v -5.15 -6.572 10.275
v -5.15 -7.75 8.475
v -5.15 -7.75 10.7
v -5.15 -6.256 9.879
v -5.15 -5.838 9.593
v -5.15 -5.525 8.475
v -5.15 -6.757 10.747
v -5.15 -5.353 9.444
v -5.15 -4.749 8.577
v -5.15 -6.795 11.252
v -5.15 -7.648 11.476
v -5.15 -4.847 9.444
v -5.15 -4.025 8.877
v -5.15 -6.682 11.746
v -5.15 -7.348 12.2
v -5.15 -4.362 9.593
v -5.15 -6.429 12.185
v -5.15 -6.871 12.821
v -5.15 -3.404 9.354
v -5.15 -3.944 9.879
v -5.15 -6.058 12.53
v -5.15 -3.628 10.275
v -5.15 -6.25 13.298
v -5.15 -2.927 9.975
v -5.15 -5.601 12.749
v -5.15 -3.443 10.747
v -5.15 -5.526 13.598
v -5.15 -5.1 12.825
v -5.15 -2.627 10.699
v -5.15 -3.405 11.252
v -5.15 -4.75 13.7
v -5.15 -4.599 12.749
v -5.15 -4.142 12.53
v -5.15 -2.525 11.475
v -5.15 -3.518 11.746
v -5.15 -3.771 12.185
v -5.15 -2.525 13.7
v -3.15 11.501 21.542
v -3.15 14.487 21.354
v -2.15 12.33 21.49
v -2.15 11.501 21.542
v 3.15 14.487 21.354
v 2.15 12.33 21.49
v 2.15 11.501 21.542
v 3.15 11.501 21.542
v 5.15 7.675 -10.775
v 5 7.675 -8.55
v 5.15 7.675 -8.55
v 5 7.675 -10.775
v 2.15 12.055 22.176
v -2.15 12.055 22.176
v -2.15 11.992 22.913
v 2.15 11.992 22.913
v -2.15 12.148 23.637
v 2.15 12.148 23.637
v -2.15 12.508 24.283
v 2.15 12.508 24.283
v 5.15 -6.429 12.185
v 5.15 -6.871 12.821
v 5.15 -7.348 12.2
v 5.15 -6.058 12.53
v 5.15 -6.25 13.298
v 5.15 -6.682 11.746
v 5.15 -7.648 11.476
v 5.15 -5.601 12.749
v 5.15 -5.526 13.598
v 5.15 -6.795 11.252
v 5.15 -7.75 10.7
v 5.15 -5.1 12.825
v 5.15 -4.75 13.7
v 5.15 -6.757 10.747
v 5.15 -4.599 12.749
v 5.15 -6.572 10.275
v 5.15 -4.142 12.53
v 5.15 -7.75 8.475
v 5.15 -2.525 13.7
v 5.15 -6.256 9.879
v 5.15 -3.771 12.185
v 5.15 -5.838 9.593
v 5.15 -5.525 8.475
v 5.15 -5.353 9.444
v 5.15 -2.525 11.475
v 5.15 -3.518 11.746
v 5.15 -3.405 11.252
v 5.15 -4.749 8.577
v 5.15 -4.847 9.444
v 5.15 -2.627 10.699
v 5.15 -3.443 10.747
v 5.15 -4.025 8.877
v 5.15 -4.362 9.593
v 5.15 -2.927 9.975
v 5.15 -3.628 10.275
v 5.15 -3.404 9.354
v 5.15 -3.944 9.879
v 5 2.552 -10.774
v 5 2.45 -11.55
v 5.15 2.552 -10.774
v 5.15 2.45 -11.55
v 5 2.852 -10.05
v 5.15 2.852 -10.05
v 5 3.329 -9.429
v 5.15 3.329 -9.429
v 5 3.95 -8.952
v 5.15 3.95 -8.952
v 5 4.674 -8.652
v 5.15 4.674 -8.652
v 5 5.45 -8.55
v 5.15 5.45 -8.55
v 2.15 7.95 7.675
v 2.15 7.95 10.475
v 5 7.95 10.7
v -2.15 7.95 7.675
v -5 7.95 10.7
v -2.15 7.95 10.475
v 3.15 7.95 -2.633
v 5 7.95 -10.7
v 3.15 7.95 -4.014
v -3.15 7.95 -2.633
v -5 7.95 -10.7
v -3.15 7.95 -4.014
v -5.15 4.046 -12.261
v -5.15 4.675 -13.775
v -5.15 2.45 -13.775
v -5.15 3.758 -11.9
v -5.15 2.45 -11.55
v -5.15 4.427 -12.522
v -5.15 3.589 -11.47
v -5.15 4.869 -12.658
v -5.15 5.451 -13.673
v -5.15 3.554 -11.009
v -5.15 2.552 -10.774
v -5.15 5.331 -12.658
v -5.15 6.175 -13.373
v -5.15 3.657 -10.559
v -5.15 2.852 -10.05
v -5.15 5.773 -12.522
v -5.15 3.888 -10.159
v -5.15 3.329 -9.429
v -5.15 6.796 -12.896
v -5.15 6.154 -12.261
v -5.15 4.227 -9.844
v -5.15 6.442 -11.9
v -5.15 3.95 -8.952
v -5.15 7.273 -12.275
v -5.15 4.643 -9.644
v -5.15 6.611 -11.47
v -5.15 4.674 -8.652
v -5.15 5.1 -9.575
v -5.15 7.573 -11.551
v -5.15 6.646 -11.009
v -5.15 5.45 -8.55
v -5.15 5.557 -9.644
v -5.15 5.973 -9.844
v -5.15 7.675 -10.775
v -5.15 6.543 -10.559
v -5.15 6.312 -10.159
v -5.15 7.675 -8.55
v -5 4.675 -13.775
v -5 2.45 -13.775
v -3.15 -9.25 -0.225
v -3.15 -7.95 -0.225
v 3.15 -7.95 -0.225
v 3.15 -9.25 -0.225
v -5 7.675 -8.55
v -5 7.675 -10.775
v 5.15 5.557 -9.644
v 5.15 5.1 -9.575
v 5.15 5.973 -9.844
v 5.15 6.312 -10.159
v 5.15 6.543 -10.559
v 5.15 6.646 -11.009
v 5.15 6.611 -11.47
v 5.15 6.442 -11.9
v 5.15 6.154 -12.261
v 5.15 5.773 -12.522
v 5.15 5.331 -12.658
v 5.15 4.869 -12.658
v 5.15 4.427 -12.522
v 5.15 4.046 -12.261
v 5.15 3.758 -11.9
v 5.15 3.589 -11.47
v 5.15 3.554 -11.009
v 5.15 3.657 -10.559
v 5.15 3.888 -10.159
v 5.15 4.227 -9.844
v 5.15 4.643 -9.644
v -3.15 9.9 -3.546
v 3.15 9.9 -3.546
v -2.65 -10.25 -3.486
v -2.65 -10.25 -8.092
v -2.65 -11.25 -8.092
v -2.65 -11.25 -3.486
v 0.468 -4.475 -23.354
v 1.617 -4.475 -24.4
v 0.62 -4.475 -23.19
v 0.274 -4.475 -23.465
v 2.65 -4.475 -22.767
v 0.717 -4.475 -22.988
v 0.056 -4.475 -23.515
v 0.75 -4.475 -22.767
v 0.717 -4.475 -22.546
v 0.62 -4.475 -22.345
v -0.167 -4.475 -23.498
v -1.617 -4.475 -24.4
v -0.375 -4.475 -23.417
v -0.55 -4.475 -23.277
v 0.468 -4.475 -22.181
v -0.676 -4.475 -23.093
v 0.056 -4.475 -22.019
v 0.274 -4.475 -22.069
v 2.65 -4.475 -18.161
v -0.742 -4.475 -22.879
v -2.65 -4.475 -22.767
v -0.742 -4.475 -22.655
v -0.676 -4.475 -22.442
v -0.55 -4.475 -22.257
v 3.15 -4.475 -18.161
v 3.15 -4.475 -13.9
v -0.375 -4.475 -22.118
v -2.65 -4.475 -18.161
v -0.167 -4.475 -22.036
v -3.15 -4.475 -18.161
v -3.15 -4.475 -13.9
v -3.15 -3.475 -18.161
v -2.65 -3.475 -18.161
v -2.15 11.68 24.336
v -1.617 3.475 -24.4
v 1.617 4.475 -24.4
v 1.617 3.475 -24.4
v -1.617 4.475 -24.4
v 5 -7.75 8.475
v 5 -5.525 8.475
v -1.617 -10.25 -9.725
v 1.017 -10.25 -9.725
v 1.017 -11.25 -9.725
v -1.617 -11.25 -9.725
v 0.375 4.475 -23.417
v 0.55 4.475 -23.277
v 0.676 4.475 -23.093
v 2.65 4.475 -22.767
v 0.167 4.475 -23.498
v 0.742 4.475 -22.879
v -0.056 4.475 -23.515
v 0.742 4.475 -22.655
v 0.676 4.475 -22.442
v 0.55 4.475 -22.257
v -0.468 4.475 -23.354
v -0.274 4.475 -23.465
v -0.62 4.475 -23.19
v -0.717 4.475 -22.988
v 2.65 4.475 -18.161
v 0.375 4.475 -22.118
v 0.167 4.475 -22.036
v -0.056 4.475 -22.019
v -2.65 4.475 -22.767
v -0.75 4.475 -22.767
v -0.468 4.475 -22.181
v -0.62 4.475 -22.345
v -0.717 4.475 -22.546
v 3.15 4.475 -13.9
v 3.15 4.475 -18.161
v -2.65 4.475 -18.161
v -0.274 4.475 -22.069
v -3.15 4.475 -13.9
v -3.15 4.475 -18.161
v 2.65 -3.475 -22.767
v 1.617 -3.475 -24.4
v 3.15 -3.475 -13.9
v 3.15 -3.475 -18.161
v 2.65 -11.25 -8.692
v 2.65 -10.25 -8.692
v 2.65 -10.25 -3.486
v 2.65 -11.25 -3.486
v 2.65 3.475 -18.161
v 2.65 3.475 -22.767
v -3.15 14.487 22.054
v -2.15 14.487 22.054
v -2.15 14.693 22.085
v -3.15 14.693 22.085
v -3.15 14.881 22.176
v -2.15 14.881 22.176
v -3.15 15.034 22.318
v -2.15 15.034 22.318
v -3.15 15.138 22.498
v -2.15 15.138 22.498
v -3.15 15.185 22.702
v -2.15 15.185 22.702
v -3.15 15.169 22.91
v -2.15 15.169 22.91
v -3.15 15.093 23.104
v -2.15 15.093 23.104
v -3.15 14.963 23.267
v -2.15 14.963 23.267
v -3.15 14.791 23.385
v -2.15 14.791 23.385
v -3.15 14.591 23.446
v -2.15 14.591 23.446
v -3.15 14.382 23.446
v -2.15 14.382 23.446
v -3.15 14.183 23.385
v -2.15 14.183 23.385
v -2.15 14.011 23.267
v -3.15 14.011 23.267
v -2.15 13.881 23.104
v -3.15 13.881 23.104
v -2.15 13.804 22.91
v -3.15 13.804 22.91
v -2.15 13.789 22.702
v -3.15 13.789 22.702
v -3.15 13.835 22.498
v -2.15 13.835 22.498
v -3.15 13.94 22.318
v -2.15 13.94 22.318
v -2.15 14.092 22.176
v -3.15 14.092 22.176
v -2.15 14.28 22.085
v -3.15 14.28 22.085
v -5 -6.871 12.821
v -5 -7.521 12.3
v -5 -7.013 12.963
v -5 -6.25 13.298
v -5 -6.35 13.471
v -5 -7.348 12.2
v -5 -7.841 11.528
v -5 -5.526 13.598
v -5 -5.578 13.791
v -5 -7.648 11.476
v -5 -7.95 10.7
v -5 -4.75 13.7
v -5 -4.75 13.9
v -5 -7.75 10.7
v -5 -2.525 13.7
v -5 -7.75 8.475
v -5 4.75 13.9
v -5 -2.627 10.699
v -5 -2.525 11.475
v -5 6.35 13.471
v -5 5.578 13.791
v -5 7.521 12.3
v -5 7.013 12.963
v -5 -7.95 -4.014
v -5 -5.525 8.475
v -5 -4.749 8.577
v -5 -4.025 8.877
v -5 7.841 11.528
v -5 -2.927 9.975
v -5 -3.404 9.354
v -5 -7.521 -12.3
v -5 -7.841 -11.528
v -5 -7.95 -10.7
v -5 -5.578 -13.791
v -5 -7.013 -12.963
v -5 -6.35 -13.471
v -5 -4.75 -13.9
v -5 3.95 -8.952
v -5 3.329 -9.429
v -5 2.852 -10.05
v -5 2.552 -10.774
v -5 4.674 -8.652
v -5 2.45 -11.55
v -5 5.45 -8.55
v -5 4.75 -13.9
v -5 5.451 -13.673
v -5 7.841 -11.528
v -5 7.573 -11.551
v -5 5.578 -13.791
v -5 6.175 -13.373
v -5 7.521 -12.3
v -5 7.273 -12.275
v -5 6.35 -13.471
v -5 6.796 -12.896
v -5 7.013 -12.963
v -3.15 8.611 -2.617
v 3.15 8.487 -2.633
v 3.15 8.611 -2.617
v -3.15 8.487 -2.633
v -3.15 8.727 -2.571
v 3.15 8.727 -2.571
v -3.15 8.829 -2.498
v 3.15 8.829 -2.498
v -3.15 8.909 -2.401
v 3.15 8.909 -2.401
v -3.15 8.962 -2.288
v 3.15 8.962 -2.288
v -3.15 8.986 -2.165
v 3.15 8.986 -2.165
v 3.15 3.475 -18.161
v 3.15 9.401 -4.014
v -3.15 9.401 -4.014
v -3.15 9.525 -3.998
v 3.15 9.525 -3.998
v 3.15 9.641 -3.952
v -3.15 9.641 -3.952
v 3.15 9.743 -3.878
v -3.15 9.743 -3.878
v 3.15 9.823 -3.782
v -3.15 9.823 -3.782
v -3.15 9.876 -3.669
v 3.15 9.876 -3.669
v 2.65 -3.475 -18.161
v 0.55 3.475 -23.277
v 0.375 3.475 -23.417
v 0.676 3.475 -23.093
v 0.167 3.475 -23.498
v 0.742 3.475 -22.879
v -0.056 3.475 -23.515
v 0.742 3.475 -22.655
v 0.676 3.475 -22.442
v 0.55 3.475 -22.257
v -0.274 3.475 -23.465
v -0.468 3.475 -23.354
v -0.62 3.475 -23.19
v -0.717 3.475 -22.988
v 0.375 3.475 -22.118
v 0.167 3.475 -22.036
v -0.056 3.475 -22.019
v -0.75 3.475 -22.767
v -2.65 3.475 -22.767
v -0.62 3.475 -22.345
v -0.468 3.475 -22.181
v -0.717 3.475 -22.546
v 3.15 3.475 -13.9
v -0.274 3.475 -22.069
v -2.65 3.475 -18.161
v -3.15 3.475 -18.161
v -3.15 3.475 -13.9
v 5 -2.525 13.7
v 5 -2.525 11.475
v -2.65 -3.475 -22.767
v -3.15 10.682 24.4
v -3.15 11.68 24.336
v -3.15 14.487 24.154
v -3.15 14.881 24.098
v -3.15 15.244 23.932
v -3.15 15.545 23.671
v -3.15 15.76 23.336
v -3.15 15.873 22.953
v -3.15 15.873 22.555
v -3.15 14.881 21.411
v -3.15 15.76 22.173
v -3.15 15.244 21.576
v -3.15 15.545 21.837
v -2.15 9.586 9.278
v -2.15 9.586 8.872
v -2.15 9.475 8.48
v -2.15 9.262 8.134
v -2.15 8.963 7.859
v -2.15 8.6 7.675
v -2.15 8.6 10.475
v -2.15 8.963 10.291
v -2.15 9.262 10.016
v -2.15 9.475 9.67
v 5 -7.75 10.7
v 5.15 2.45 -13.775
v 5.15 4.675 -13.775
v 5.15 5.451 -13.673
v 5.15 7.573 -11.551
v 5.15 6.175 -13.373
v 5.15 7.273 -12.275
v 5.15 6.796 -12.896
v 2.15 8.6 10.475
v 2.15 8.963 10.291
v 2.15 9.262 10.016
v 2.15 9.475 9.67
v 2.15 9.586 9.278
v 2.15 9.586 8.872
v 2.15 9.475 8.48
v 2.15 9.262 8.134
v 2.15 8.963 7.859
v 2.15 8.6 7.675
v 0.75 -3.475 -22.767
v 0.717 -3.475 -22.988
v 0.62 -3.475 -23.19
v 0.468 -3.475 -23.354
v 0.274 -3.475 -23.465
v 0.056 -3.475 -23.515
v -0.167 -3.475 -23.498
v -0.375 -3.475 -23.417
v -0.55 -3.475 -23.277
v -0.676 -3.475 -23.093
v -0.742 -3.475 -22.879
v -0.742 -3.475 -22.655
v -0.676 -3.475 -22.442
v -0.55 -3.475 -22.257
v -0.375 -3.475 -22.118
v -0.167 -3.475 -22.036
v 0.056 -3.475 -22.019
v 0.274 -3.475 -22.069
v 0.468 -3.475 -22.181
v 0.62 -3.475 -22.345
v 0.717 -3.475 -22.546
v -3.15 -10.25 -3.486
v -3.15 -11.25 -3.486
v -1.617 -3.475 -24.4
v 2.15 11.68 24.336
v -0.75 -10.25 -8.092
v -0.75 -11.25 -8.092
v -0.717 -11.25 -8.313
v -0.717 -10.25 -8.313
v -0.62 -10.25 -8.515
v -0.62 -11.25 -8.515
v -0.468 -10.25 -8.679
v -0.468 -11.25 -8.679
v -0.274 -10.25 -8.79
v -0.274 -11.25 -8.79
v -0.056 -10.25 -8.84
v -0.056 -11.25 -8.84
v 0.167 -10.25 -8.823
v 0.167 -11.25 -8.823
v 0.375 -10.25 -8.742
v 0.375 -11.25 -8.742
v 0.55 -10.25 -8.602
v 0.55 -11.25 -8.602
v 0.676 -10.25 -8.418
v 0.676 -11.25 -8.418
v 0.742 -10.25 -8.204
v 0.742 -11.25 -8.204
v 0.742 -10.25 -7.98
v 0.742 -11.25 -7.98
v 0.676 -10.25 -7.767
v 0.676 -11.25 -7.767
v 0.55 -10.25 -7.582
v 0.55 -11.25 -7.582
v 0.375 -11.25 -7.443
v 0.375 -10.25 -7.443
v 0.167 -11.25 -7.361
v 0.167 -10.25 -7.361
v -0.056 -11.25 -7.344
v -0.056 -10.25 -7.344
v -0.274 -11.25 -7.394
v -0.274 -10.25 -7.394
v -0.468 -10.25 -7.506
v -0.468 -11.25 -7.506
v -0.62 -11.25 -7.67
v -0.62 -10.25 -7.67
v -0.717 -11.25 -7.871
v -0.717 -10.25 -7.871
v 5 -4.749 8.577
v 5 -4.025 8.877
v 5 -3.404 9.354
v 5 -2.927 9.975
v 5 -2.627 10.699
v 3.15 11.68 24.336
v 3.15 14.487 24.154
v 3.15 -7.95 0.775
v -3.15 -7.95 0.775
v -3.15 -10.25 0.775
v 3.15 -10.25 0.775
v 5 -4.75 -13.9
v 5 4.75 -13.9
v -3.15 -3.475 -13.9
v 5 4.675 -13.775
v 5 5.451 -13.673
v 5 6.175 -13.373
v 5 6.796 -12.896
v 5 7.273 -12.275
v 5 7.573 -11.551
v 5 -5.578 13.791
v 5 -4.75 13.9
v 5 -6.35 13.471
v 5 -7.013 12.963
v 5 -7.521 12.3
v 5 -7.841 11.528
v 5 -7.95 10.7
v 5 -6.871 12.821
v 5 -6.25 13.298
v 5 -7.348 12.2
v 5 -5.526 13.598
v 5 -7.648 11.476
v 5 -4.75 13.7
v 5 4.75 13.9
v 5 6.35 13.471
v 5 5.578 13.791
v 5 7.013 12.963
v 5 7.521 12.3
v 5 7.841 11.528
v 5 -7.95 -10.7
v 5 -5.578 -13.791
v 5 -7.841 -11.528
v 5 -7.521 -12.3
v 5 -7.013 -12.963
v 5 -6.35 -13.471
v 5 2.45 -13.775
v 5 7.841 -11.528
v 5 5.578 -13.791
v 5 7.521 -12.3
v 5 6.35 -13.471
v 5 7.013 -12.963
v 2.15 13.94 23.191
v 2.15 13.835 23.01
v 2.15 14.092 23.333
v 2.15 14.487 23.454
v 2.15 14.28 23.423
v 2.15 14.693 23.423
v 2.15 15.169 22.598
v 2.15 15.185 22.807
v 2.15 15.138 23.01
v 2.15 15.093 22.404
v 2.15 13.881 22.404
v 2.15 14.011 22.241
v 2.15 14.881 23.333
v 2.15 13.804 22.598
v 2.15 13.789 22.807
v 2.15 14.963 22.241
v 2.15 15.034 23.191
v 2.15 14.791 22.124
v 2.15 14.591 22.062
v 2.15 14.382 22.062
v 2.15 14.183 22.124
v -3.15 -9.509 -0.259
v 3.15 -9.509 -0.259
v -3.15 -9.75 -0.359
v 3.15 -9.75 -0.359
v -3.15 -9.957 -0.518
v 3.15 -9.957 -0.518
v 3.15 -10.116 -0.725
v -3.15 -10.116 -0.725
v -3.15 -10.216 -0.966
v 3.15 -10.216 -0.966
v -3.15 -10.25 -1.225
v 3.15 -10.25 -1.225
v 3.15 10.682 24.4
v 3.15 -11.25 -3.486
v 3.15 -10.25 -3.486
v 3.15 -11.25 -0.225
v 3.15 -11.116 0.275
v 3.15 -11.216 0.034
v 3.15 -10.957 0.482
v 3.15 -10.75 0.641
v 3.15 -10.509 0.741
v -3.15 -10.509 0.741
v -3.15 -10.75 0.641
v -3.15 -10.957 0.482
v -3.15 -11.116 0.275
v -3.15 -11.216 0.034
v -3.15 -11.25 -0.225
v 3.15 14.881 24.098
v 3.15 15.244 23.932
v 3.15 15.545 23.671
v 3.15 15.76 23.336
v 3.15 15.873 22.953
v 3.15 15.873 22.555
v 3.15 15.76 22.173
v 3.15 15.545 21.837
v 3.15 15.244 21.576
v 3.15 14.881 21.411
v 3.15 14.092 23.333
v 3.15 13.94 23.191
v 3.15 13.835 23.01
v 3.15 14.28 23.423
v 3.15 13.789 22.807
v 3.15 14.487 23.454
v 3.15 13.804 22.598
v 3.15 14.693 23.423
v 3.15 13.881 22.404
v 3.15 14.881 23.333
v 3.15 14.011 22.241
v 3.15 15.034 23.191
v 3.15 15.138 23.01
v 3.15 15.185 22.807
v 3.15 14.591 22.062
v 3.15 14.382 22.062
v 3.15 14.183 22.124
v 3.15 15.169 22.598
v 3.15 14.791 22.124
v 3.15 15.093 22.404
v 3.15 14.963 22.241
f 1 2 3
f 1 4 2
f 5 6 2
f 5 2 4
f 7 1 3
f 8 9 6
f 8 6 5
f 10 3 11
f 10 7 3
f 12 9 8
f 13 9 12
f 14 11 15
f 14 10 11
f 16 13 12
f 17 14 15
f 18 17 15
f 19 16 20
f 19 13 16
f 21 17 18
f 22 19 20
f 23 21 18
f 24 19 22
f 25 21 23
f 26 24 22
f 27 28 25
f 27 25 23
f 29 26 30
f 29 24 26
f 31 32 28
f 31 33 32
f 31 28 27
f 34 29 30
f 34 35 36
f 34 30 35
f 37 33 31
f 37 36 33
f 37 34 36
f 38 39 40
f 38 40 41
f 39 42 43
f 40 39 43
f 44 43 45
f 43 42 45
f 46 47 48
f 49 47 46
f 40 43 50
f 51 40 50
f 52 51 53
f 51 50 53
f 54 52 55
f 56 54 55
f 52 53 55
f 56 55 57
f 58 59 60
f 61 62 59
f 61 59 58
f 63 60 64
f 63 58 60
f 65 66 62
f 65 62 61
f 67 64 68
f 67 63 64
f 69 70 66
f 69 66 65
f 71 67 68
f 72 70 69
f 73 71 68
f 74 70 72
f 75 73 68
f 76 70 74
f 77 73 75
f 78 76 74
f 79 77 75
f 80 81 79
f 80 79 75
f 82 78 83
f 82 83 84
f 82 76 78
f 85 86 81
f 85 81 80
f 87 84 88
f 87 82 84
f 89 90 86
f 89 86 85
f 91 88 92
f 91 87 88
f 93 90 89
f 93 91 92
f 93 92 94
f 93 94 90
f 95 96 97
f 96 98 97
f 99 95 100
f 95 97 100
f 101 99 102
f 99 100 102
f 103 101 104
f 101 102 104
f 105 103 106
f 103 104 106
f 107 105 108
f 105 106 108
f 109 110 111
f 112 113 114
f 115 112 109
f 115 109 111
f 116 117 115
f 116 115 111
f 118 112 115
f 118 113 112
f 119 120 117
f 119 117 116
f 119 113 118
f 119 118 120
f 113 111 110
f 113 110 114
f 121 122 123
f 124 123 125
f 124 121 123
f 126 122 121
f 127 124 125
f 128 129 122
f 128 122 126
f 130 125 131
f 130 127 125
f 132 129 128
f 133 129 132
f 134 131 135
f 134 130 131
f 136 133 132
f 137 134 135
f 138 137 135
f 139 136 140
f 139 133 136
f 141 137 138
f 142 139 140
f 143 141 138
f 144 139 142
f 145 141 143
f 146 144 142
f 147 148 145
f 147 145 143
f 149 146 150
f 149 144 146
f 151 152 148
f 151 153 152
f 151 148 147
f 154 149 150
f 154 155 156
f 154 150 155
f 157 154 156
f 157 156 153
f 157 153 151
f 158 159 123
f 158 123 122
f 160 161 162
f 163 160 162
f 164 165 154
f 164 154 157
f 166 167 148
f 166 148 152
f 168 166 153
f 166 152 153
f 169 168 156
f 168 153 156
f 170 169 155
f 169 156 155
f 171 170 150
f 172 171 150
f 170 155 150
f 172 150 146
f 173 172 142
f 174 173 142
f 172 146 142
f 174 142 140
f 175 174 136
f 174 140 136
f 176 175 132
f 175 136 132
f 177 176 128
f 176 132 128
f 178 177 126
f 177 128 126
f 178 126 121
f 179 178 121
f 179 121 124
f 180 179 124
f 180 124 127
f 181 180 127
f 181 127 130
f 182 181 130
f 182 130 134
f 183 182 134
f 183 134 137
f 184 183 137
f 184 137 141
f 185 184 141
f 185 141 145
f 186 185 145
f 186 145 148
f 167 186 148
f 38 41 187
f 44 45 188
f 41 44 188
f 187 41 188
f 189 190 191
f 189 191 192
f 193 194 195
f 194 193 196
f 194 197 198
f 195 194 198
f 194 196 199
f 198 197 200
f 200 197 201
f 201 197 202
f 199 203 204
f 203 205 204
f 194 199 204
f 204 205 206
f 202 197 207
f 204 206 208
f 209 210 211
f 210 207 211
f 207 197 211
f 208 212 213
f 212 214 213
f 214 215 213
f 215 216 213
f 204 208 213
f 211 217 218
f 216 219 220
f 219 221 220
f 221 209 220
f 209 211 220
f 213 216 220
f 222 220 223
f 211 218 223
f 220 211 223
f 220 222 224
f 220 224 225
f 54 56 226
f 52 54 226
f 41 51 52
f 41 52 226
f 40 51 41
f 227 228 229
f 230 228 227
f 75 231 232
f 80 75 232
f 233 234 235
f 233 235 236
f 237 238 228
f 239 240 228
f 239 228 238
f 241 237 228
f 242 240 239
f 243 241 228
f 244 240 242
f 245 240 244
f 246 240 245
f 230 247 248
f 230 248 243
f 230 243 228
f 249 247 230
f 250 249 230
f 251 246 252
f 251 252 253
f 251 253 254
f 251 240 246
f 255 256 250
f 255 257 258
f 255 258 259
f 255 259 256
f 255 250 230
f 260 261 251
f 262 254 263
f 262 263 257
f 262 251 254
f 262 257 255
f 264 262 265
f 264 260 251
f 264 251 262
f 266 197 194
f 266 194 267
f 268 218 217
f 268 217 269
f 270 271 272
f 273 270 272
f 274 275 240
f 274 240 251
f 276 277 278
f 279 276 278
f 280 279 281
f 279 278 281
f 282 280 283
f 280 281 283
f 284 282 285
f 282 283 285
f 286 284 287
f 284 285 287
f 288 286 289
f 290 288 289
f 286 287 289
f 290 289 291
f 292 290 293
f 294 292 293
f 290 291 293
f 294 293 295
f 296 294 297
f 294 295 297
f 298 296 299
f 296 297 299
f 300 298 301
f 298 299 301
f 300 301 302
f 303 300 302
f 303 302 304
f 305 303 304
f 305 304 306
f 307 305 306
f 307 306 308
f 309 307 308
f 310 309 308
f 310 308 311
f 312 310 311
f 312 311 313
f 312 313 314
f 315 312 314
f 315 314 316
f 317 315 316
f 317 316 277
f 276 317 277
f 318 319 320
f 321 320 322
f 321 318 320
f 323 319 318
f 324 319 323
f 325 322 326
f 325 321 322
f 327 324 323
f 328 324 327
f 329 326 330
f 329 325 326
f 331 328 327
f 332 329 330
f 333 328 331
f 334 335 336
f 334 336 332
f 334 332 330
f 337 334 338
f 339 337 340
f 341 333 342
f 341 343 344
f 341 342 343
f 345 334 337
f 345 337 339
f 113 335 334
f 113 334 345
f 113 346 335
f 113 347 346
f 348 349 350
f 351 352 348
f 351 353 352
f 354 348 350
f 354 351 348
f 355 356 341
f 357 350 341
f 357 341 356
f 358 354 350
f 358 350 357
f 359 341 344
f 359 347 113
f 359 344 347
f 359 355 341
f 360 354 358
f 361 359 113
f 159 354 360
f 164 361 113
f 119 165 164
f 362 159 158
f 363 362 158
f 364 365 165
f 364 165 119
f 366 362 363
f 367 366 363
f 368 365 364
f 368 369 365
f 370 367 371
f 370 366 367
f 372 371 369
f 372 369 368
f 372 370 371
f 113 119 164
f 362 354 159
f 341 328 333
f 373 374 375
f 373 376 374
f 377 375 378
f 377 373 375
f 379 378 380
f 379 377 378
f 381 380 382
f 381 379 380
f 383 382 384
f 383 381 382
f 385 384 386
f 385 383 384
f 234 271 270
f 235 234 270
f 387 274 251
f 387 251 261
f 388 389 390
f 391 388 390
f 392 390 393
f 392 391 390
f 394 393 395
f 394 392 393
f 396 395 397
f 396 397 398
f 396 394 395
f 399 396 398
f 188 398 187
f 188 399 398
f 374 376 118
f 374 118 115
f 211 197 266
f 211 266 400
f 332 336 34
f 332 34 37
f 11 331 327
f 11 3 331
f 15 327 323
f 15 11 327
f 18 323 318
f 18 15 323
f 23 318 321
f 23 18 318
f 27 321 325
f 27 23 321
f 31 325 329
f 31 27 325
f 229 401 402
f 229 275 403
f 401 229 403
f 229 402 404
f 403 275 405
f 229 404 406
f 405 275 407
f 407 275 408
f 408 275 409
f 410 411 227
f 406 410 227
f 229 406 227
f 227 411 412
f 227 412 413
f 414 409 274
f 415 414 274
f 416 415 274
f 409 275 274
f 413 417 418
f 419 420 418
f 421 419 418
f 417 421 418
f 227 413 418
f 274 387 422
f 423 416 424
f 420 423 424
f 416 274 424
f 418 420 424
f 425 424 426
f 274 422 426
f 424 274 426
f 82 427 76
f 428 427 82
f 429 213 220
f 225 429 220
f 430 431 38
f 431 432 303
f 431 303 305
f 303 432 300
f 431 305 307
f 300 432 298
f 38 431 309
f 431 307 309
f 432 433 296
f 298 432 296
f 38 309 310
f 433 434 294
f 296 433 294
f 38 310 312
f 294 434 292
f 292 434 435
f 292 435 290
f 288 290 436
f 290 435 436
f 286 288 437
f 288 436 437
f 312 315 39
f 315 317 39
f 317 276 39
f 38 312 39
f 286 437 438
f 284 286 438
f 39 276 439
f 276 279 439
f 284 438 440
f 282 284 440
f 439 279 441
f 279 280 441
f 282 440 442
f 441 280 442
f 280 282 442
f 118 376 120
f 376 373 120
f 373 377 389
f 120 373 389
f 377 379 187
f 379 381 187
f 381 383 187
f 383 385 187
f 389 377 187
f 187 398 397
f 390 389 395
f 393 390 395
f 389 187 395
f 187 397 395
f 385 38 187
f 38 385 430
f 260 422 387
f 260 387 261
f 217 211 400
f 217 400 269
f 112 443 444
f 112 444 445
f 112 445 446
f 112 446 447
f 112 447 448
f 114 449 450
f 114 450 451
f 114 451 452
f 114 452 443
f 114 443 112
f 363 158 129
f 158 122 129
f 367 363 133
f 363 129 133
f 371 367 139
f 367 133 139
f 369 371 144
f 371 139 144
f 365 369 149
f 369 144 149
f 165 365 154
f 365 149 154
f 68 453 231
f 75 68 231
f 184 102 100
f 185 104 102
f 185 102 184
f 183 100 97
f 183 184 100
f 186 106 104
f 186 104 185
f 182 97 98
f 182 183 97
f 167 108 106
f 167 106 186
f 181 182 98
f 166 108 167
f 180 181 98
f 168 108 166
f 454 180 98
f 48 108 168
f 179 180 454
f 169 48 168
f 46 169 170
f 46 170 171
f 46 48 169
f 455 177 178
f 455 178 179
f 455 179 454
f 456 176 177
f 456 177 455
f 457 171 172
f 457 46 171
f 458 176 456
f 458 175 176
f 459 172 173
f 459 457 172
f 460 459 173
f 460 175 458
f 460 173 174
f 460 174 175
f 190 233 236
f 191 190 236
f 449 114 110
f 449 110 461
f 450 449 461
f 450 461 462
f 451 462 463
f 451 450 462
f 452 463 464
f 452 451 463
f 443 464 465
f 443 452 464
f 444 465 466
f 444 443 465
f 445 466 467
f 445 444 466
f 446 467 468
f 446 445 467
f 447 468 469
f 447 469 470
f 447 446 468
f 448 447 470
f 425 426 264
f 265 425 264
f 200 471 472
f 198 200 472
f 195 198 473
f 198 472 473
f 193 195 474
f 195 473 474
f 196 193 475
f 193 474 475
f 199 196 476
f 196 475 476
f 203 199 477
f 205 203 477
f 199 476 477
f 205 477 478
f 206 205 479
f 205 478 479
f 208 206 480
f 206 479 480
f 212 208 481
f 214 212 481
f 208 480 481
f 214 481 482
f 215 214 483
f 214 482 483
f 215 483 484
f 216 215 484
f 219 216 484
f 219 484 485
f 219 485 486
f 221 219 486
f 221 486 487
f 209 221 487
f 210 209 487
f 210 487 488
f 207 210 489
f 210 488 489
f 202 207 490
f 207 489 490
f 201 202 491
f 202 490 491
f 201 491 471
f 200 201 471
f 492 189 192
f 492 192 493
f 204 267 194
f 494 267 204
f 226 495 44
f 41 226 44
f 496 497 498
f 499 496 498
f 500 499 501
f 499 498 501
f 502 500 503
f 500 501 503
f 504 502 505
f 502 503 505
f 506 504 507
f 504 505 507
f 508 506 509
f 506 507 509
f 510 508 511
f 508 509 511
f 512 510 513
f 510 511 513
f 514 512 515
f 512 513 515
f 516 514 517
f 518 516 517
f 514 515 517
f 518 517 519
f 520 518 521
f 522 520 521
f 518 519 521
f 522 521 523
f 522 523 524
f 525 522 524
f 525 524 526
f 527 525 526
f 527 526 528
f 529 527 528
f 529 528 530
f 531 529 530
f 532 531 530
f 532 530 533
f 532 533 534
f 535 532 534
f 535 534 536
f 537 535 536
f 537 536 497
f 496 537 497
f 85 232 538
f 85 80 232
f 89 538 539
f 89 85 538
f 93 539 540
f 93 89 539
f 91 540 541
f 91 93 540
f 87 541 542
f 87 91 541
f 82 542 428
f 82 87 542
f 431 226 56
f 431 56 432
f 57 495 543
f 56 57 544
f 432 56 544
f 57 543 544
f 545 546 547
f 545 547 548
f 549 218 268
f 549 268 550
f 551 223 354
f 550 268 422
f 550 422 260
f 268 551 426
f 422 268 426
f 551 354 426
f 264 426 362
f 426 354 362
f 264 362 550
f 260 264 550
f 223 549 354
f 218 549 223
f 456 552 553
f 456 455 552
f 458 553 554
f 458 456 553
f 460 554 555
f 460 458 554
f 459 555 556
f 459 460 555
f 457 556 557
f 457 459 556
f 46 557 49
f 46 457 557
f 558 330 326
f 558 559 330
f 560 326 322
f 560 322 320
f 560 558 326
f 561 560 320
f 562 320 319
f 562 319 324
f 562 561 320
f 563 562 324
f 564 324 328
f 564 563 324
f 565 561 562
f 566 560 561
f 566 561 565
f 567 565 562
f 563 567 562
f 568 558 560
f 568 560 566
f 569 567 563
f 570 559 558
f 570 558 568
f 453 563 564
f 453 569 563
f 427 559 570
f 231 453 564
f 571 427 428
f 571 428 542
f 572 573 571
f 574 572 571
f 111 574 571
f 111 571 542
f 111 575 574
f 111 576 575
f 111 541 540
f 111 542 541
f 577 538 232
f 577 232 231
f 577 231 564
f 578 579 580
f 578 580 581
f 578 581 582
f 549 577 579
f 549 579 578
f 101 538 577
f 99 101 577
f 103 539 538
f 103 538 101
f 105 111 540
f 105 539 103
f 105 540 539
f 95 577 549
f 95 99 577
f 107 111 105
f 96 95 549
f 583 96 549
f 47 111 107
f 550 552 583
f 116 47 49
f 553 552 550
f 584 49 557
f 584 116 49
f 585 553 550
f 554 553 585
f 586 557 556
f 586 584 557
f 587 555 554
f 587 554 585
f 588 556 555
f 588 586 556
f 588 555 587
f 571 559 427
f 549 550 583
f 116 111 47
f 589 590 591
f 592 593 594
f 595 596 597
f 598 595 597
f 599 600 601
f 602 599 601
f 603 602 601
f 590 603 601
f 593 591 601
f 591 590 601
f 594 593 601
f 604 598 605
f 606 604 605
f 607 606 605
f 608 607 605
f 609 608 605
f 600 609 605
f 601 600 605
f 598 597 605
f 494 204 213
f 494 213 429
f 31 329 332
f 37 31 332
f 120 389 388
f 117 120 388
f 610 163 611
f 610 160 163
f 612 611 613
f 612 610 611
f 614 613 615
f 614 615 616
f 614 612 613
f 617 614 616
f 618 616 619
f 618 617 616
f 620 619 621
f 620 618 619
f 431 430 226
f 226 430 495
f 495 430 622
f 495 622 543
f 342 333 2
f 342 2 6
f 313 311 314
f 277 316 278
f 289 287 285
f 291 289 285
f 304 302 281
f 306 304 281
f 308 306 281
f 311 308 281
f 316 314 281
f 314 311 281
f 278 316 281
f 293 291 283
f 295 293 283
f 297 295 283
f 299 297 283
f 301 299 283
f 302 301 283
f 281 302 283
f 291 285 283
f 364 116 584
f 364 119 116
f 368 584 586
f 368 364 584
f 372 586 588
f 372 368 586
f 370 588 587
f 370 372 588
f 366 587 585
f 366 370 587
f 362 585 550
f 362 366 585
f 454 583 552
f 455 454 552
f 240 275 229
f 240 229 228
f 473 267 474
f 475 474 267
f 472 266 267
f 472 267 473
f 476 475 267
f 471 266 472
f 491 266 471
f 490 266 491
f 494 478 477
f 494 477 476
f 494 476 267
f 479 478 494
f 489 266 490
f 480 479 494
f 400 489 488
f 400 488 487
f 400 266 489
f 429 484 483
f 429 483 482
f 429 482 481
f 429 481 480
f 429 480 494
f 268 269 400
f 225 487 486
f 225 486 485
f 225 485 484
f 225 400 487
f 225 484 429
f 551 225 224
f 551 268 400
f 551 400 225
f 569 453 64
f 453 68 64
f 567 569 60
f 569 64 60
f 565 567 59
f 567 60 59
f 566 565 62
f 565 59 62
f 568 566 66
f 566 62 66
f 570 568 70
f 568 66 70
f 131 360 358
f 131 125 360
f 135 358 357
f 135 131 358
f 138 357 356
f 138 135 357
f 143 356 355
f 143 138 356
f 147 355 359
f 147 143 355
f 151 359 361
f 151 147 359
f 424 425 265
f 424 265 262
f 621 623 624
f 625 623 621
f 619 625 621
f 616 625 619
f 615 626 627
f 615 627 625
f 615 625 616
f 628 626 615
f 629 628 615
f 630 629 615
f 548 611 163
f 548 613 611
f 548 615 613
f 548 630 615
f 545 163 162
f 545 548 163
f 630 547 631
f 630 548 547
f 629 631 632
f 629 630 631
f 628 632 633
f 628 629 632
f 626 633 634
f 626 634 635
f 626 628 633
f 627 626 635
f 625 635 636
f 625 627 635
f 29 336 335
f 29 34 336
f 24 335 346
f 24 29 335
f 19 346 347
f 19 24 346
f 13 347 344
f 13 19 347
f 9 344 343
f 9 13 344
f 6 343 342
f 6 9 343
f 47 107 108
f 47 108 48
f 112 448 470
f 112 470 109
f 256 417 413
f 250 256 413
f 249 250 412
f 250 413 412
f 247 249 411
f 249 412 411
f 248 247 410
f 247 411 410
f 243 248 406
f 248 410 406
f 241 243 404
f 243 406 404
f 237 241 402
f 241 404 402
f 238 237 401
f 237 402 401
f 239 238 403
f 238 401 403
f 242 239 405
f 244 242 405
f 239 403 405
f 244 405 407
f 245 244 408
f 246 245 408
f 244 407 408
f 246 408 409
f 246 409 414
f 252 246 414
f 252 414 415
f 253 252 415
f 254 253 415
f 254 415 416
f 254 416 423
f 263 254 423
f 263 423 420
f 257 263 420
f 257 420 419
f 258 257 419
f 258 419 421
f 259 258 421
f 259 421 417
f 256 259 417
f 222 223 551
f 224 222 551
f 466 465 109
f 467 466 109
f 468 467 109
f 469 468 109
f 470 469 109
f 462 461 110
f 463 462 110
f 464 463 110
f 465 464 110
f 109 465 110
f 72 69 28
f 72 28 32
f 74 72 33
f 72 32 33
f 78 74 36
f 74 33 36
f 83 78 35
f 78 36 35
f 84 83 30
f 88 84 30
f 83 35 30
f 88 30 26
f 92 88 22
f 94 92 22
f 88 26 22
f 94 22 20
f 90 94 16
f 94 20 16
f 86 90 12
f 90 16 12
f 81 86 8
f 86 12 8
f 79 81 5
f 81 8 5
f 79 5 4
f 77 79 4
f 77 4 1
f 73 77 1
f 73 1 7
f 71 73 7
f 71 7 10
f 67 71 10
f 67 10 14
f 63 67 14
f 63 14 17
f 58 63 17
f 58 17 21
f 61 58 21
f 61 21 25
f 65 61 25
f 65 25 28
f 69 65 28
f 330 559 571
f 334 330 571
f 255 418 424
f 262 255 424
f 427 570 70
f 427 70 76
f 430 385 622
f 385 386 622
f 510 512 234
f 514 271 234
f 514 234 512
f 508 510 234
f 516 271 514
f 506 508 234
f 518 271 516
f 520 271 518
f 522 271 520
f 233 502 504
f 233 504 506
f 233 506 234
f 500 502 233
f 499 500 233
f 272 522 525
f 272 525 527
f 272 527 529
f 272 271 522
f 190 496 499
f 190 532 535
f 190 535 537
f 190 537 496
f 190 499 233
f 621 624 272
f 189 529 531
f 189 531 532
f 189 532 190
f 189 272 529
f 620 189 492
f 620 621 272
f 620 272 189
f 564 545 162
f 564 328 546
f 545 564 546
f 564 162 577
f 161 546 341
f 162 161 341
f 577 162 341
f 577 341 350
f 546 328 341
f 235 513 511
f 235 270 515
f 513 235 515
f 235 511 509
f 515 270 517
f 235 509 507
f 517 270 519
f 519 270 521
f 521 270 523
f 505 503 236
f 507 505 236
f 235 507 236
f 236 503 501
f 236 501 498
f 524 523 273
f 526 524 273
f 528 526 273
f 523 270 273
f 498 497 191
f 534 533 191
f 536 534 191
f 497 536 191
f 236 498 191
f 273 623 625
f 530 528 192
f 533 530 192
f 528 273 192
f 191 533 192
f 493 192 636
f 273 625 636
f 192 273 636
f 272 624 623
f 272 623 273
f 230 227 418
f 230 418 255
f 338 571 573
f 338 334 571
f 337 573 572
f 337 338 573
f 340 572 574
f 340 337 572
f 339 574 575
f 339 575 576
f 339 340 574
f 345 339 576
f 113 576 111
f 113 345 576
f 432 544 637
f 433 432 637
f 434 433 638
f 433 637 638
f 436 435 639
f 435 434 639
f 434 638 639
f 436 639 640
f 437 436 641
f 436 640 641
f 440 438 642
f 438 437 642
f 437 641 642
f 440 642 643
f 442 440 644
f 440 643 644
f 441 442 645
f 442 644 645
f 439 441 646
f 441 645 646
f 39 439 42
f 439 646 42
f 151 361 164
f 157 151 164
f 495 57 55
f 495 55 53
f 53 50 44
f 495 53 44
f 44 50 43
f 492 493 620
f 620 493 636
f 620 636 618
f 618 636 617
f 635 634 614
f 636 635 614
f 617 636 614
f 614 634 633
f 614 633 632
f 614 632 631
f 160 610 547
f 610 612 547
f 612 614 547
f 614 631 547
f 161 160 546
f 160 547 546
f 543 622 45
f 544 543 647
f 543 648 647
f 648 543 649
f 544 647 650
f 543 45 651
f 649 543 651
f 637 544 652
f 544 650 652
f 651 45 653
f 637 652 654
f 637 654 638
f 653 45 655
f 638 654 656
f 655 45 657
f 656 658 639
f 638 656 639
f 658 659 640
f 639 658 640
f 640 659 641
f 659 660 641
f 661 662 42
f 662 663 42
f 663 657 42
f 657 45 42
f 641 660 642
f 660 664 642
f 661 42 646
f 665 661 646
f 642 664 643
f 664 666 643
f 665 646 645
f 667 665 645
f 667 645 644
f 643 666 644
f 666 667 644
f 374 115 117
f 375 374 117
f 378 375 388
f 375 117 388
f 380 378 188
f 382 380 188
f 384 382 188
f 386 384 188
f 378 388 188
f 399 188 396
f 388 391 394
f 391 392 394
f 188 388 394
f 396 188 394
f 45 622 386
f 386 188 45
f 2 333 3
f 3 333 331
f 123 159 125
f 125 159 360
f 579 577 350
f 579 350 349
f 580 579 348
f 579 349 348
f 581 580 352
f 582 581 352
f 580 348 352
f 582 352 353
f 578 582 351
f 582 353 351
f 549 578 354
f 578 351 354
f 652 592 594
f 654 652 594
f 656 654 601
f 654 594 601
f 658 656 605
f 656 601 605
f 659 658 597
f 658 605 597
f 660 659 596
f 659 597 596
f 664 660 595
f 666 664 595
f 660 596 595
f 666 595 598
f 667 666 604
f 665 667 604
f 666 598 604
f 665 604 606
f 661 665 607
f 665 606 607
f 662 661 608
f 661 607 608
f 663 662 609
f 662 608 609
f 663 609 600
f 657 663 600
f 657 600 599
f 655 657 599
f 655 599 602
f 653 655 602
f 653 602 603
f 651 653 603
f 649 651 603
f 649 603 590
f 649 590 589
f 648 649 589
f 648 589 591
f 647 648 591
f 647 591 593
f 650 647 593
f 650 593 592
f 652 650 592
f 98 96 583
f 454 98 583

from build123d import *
from OCP.BRepFilletAPI import BRepFilletAPI_MakeChamfer

# Parameters (mm, degrees)
BOSS_EXTRUDE1_DEPTH        = 4.3
BOSS_EXTRUDE2_DEPTH        = 1
BOSS_EXTRUDE3_START        = 1
BOSS_EXTRUDE3_DEPTH        = 1
CUT_EXTRUDE1_DEPTH         = 4.3
SKETCH5_W                  = 1.380694599
SKETCH5_H                  = 0.913887033
BOSS_EXTRUDE4_DEPTH        = 1.85
SKETCH6_W                  = 8.15
SKETCH6_H                  = 1.380694599
BOSS_EXTRUDE5_DEPTH        = 16.905731032
SKETCH7_W                  = 8.15
SKETCH7_H                  = 17.819618065
BOSS_EXTRUDE6_DEPTH        = 9.886282081
CUT_EXTRUDE2_DEPTH         = 0.913887033
CUT_EXTRUDE3_DEPTH         = 1.005731032
SKETCH10_W                 = 8.15
SKETCH10_H                 = 15.9
BOSS_EXTRUDE7_DEPTH        = 16.53302332
SKETCH11_W                 = 27.8
SKETCH11_H                 = 15.9
BOSS_EXTRUDE8_DEPTH        = 1.85
SKETCH12_W                 = 6.3
SKETCH12_H                 = 1
BOSS_EXTRUDE9_DEPTH        = 3.3
SKETCH13_W                 = 6.3
SKETCH13_H                 = 1
BOSS_EXTRUDE10_DEPTH       = 9.5
SKETCH14_W                 = 0.5
SKETCH14_H                 = 6.238763167
CUT_EXTRUDE4_DEPTH         = 37.103920655
SKETCH15_W                 = 0.5
SKETCH15_H                 = 6.238763167
CUT_EXTRUDE5_DEPTH         = 37.103920655
SKETCH16_W                 = 6.3
SKETCH16_H                 = 1
BOSS_EXTRUDE11_DEPTH       = 10.5
SKETCH17_W                 = 0.5
SKETCH17_H                 = 6.238763167
CUT_EXTRUDE6_DEPTH         = 29.934160174
SKETCH18_W                 = 0.5
SKETCH18_H                 = 6.238763167
CUT_EXTRUDE7_DEPTH         = 29.934160174
SKETCH19_W                 = 6.3
SKETCH19_H                 = 1
BOSS_EXTRUDE12_DEPTH       = 10.5
SKETCH20_W                 = 0.5
SKETCH20_H                 = 6.238763167
CUT_EXTRUDE8_DEPTH         = 33.170848621
SKETCH21_W                 = 0.5
SKETCH21_H                 = 6.238763167
CUT_EXTRUDE9_DEPTH         = 33.170848621
SKETCH22_W                 = 5.225
SKETCH22_H                 = 5.225
BOSS_EXTRUDE13_DEPTH       = 0.15
SKETCH23_W                 = 5.225
SKETCH23_H                 = 5.225
BOSS_EXTRUDE14_DEPTH       = 0.15
BOSS_EXTRUDE15_DEPTH       = 4.3
SKETCH25_W                 = 5.225
SKETCH25_H                 = 5.225
BOSS_EXTRUDE16_DEPTH       = 0.15
SKETCH26_W                 = 5.225
SKETCH26_H                 = 5.225
BOSS_EXTRUDE17_DEPTH       = 0.15
F_00_CLEARANCE_HOLE1_D     = 1.5
F_00_CLEARANCE_HOLE1_DEPTH = 1
F_00_CLEARANCE_HOLE2_D     = 1.5
F_00_CLEARANCE_HOLE2_DEPTH = 15.725
F_4_CLEARANCE_HOLE1_D      = 3.1
F_4_CLEARANCE_HOLE2_D      = 3.4
F_00_CLEARANCE_HOLE3_D     = 1.5
F_00_CLEARANCE_HOLE3_DEPTH = 1
F_00_CLEARANCE_HOLE4_D     = 1.4
F_00_CLEARANCE_HOLE4_DEPTH = 1
F_00_CLEARANCE_HOLE5_D     = 1.4
F_00_CLEARANCE_HOLE5_DEPTH = 1
CHAMFER1_SIZE              = 1.632857048
CHAMFER1_SIZE2             = 1.033032958
CHAMFER2_SIZE              = 1.033032958
CHAMFER2_SIZE2             = 1.632857048
CHAMFER3_SIZE              = 1.632857048
CHAMFER3_SIZE2             = 1.033032958
FILLET1_R                  = 0.5
FILLET2_R                  = 1
FILLET3_R                  = 3
FILLET4_R                  = 3.2


with BuildPart() as part:
    # Sketch1 → Boss-Extrude1 (new body)
    with BuildSketch(Plane(origin=(2.15, 0, 0), x_dir=(0, 0, -1), z_dir=(1, 0, 0))):
        with BuildLine():
            Line((2.63302332, 8.955731032), (4.013717919, 8.955731032))
            Line((4.013717919, 8.955731032), (4.013717919, 9.869618065))
            Line((4.013717919, 9.869618065), (-21.541974901, 11.501192936))
            Line((-21.541974901, 11.501192936), (-21.354211514, 14.486814776))
            ThreePointArc((-21.354211514, 14.486814776), (-22.754211514, 15.886814776), (-24.154211514, 14.486814776))
            Line((-24.154211514, 14.486814776), (-24.336285828, 11.679592619))
            Line((-24.336285828, 11.679592619), (-24.4, 10.681624431))
            Line((-24.4, 10.681624431), (2.63302332, 8.955731032))
        make_face()
    extrude(amount=-BOSS_EXTRUDE1_DEPTH)

    # Sketch2 → Boss-Extrude2 (add)
    with BuildSketch(Plane.ZY.offset(2.15)):
        with BuildLine():
            Line((-2.63302332, 8.955731032), (-4.013717919, 8.955731032))
            Line((-4.013717919, 8.955731032), (-4.013717919, 9.869618065))
            Line((-4.013717919, 9.869618065), (21.541974901, 11.501192936))
            Line((21.541974901, 11.501192936), (21.354211514, 14.486814776))
            ThreePointArc((21.354211514, 14.486814776), (22.754211514, 15.886814776), (24.154211514, 14.486814776))
            Line((24.154211514, 14.486814776), (24.336285828, 11.679592619))
            Line((24.336285828, 11.679592619), (24.4, 10.681624431))
            Line((24.4, 10.681624431), (-2.63302332, 8.955731032))
        make_face()
    extrude(amount=BOSS_EXTRUDE2_DEPTH)

    # Sketch3 → Boss-Extrude3 (add)
    with BuildSketch(Plane(origin=(2.15, 0, 0), x_dir=(0, 0, -1), z_dir=(1, 0, 0)).offset(BOSS_EXTRUDE3_START)):
        with BuildLine():
            Line((4.013717919, 8.955731032), (2.63302332, 8.955731032))
            Line((2.63302332, 8.955731032), (-24.4, 10.681624431))
            Line((-24.4, 10.681624431), (-24.336285828, 11.679592619))
            Line((-24.336285828, 11.679592619), (-24.154211514, 14.486814776))
            ThreePointArc((-24.154211514, 14.486814776), (-22.754211514, 15.886814776), (-21.354211514, 14.486814776))
            Line((-21.354211514, 14.486814776), (-21.541974901, 11.501192936))
            Line((-21.541974901, 11.501192936), (4.013717919, 9.869618065))
            Line((4.013717919, 9.869618065), (4.013717919, 8.955731032))
        make_face()
    extrude(amount=-BOSS_EXTRUDE3_DEPTH)

    # Sketch4 → Cut-Extrude1 (cut)
    with BuildSketch(Plane(origin=(2.15, 0, 0), x_dir=(0, 0, -1), z_dir=(1, 0, 0))):
        with BuildLine():
            Line((-24.28253184, 12.508371707), (-24.336285828, 11.679592619))
            Line((-24.336285828, 11.679592619), (-21.541974901, 11.501192936))
            Line((-21.541974901, 11.501192936), (-21.489844991, 12.330109582))
            ThreePointArc((-21.489844991, 12.330109582), (-22.913466809, 11.991892383), (-24.28253184, 12.508371707))
        make_face()
    extrude(amount=-CUT_EXTRUDE1_DEPTH, mode=Mode.SUBTRACT)

    # Sketch5 → Boss-Extrude4 (add)
    with BuildSketch(Plane.ZY.offset(3.15)):
        with Locations((-3.32337062, 9.412674549)):
            Rectangle(SKETCH5_W, SKETCH5_H)
    extrude(amount=BOSS_EXTRUDE4_DEPTH)

    # Sketch6 → Boss-Extrude5 (add)
    with BuildSketch(Plane.XZ.offset(-8.955731032)):
        with Locations((-0.925, -3.32337062)):
            Rectangle(SKETCH6_W, SKETCH6_H)
    extrude(amount=BOSS_EXTRUDE5_DEPTH)

    # Sketch7 → Boss-Extrude6 (add)
    with BuildSketch(Plane(origin=(0, 0, -4.013717919), x_dir=(-1, 0, 0), z_dir=(0, 0, -1))):
        with Locations((0.925, 0.959809033)):
            Rectangle(SKETCH7_W, SKETCH7_H)
    extrude(amount=BOSS_EXTRUDE6_DEPTH)

    # Sketch8 → Cut-Extrude2 (cut)
    with BuildSketch(Plane(origin=(0, 9.869618065, 0), x_dir=(-1, 0, 0), z_dir=(0, 1, 0))):
        Polygon((5, -13.9), (5, -2.63302332), (3.15, -2.63302332), (3.15, -4.013717919), (-3.15, -4.013717919), (-3.15, -13.9), align=None)
    extrude(amount=-CUT_EXTRUDE2_DEPTH, mode=Mode.SUBTRACT)

    # Sketch9 → Cut-Extrude3 (cut)
    with BuildSketch(Plane(origin=(0, 8.955731032, 0), x_dir=(-1, 0, 0), z_dir=(0, 1, 0))):
        Polygon((5, -13.9), (5, -2.63302332), (3.15, -2.63302332), (3.15, -4.013717919), (-3.15, -4.013717919), (-3.15, -13.9), align=None)
    extrude(amount=-CUT_EXTRUDE3_DEPTH, mode=Mode.SUBTRACT)

    # Sketch10 → Boss-Extrude7 (add)
    with BuildSketch(Plane.XY.offset(-2.63302332)):
        with Locations((-0.925, 0)):
            Rectangle(SKETCH10_W, SKETCH10_H)
    extrude(amount=BOSS_EXTRUDE7_DEPTH)

    # Sketch11 → Boss-Extrude8 (add)
    with BuildSketch(Plane(origin=(3.15, 0, 0), x_dir=(0, 0, -1), z_dir=(1, 0, 0))):
        Rectangle(SKETCH11_W, SKETCH11_H)
    extrude(amount=BOSS_EXTRUDE8_DEPTH)

    # Sketch12 → Boss-Extrude9 (add)
    with BuildSketch(Plane.XZ.offset(7.95)):
        with Locations((0, 0.275)):
            Rectangle(SKETCH12_W, SKETCH12_H)
    extrude(amount=BOSS_EXTRUDE9_DEPTH)

    # Sketch13 → Boss-Extrude10 (add)
    with BuildSketch(Plane(origin=(0, 0, -0.225), x_dir=(-1, 0, 0), z_dir=(0, 0, -1))):
        with Locations((0, -10.75)):
            Rectangle(SKETCH13_W, SKETCH13_H)
    extrude(amount=BOSS_EXTRUDE10_DEPTH)

    # Sketch14 → Cut-Extrude4 (cut, through all)
    with BuildSketch(Plane(origin=(0, -10.25, 0), x_dir=(-1, 0, 0), z_dir=(0, 1, 0))):
        with Locations((2.9, -6.605618417)):
            Rectangle(SKETCH14_W, SKETCH14_H)
    extrude(amount=-CUT_EXTRUDE4_DEPTH, mode=Mode.SUBTRACT)

    # Sketch15 → Cut-Extrude5 (cut, through all)
    with BuildSketch(Plane(origin=(0, -10.25, 0), x_dir=(-1, 0, 0), z_dir=(0, 1, 0))):
        with Locations((-2.9, -6.605618417)):
            Rectangle(SKETCH15_W, SKETCH15_H)
    extrude(amount=-CUT_EXTRUDE5_DEPTH, mode=Mode.SUBTRACT)

    # Sketch16 → Boss-Extrude11 (add)
    with BuildSketch(Plane(origin=(0, 0, -13.9), x_dir=(-1, 0, 0), z_dir=(0, 0, -1))):
        with Locations((0, 3.975)):
            Rectangle(SKETCH16_W, SKETCH16_H)
    extrude(amount=BOSS_EXTRUDE11_DEPTH)

    # Sketch17 → Cut-Extrude6 (cut, through all)
    with BuildSketch(Plane.XZ.offset(-3.475)):
        with Locations((2.9, -21.280618417)):
            Rectangle(SKETCH17_W, SKETCH17_H)
    extrude(amount=-CUT_EXTRUDE6_DEPTH, mode=Mode.SUBTRACT)

    # Sketch18 → Cut-Extrude7 (cut, through all)
    with BuildSketch(Plane.XZ.offset(-3.475)):
        with Locations((-2.9, -21.280618417)):
            Rectangle(SKETCH18_W, SKETCH18_H)
    extrude(amount=-CUT_EXTRUDE7_DEPTH, mode=Mode.SUBTRACT)

    # Sketch19 → Boss-Extrude12 (add)
    with BuildSketch(Plane(origin=(0, 0, -13.9), x_dir=(-1, 0, 0), z_dir=(0, 0, -1))):
        with Locations((0, -3.975)):
            Rectangle(SKETCH19_W, SKETCH19_H)
    extrude(amount=BOSS_EXTRUDE12_DEPTH)

    # Sketch20 → Cut-Extrude8 (cut, through all)
    with BuildSketch(Plane.XZ.offset(4.475)):
        with Locations((2.9, -21.280618417)):
            Rectangle(SKETCH20_W, SKETCH20_H)
    extrude(amount=-CUT_EXTRUDE8_DEPTH, mode=Mode.SUBTRACT)

    # Sketch21 → Cut-Extrude9 (cut, through all)
    with BuildSketch(Plane.XZ.offset(4.475)):
        with Locations((-2.9, -21.280618417)):
            Rectangle(SKETCH21_W, SKETCH21_H)
    extrude(amount=-CUT_EXTRUDE9_DEPTH, mode=Mode.SUBTRACT)

    # Sketch22 → Boss-Extrude13 (add)
    with BuildSketch(Plane.ZY.offset(5)):
        with Locations((-11.1625, 5.0625)):
            Rectangle(SKETCH22_W, SKETCH22_H)
    extrude(amount=BOSS_EXTRUDE13_DEPTH)

    # Sketch23 → Boss-Extrude14 (add)
    with BuildSketch(Plane.ZY.offset(5)):
        with Locations((11.0875, -5.1375)):
            Rectangle(SKETCH23_W, SKETCH23_H)
    extrude(amount=BOSS_EXTRUDE14_DEPTH)

    # Sketch24 → Boss-Extrude15 (add)
    with BuildSketch(Plane(origin=(-2.15, 0, 0), x_dir=(0, -1, 0), z_dir=(-1, 0, 0))):
        with BuildLine():
            Line((-8.6, 7.675), (-7.95, 7.675))
            Line((-7.95, 7.675), (-7.95, 10.475))
            Line((-7.95, 10.475), (-8.6, 10.475))
            ThreePointArc((-8.6, 10.475), (-9.6, 9.075), (-8.6, 7.675))
        make_face()
    extrude(amount=-BOSS_EXTRUDE15_DEPTH)

    # Sketch25 → Boss-Extrude16 (add)
    with BuildSketch(Plane(origin=(5, 0, 0), x_dir=(0, 0, -1), z_dir=(1, 0, 0))):
        with Locations((-11.0875, -5.1375)):
            Rectangle(SKETCH25_W, SKETCH25_H)
    extrude(amount=BOSS_EXTRUDE16_DEPTH)

    # Sketch26 → Boss-Extrude17 (add)
    with BuildSketch(Plane(origin=(5, 0, 0), x_dir=(0, 0, -1), z_dir=(1, 0, 0))):
        with Locations((11.1625, 5.0625)):
            Rectangle(SKETCH26_W, SKETCH26_H)
    extrude(amount=BOSS_EXTRUDE17_DEPTH)

    # #00 Clearance Hole1
    with Locations(Plane(origin=(0, -4.475, 0), x_dir=(-1, 0, 0), z_dir=(0, -1, 0))):
        with Locations((0, 22.767142952)):
            Hole(F_00_CLEARANCE_HOLE1_D / 2, depth=F_00_CLEARANCE_HOLE1_DEPTH)

    # #00 Clearance Hole2
    with Locations(Plane(origin=(0, 4.475, 0), x_dir=(1, 0, 0), z_dir=(0, 1, 0))):
        with Locations((0, 22.767142952)):
            Hole(F_00_CLEARANCE_HOLE2_D / 2, depth=F_00_CLEARANCE_HOLE2_DEPTH)

    # #4 Clearance Hole1 (through all)
    with Locations(Plane(origin=(5.15, 0, 0), x_dir=(0, 0, -1), z_dir=(1, 0, 0))):
        with Locations((11.125, 5.1)):
            Hole(F_4_CLEARANCE_HOLE1_D / 2)

    # #4 Clearance Hole2 (through all)
    with Locations(Plane(origin=(5.15, 0, 0), x_dir=(0, 0, -1), z_dir=(1, 0, 0))):
        with Locations((-11.125, -5.1)):
            Hole(F_4_CLEARANCE_HOLE2_D / 2)

    # #00 Clearance Hole3
    with Locations(Plane(origin=(0, -10.25, 0), x_dir=(1, 0, 0), z_dir=(0, 1, 0))):
        with Locations((0, 8.092142952)):
            Hole(F_00_CLEARANCE_HOLE3_D / 2, depth=F_00_CLEARANCE_HOLE3_DEPTH)

    # #00 Clearance Hole4
    with Locations(Plane(origin=(3.15, 0, 0), x_dir=(0, 0, -1), z_dir=(1, 0, 0))):
        with Locations((-22.754211514, 14.486814776)):
            Hole(F_00_CLEARANCE_HOLE4_D / 2, depth=F_00_CLEARANCE_HOLE4_DEPTH)

    # #00 Clearance Hole5
    with Locations(Plane.ZY.offset(3.15)):
        with Locations((22.754211514, 14.486814776)):
            Hole(F_00_CLEARANCE_HOLE5_D / 2, depth=F_00_CLEARANCE_HOLE5_DEPTH)

    # Chamfer1: one chamfer whose edges measure the first distance from different faces: ONE call of the kernel's chamfer builder (chamfer() names one face for all edges)
    chamfer1_edges_1 = [part.edges().sort_by_distance(p)[0] for p in [
        (-2.65, 3.975, -24.4),
    ]]
    chamfer1_side_1 = [part.faces().sort_by_distance(p)[0] for p in [
        (-2.65, 3.975, -21.280618417),
    ]]
    chamfer1_edges_2 = [part.edges().sort_by_distance(p)[0] for p in [
        (-2.65, -3.975, -24.4),
    ]]
    chamfer1_side_2 = [part.faces().sort_by_distance(p)[0] for p in [
        (-2.65, -3.975, -21.280618417),
    ]]
    chamfer1 = BRepFilletAPI_MakeChamfer(part.part.solid().wrapped)
    for e in chamfer1_edges_1:
        chamfer1.Add(CHAMFER1_SIZE, CHAMFER1_SIZE2, e.wrapped, chamfer1_side_1[0].wrapped)  # the first distance lies on this face
    for e in chamfer1_edges_2:
        chamfer1.Add(CHAMFER1_SIZE, CHAMFER1_SIZE2, e.wrapped, chamfer1_side_2[0].wrapped)  # the first distance lies on this face
    add(Compound.cast(chamfer1.Shape()), mode=Mode.REPLACE)

    # Chamfer2: one chamfer whose edges measure the first distance from different faces: ONE call of the kernel's chamfer builder (chamfer() names one face for all edges)
    chamfer2_edges_1 = [part.edges().sort_by_distance(p)[0] for p in [
        (2.65, 3.975, -24.4),
    ]]
    chamfer2_side_1 = [part.faces().sort_by_distance(p)[0] for p in [
        (0.516516479, 3.975, -24.4),
    ]]
    chamfer2_edges_2 = [part.edges().sort_by_distance(p)[0] for p in [
        (2.65, -3.975, -24.4),
    ]]
    chamfer2_side_2 = [part.faces().sort_by_distance(p)[0] for p in [
        (0.516516479, -3.975, -24.4),
    ]]
    chamfer2 = BRepFilletAPI_MakeChamfer(part.part.solid().wrapped)
    for e in chamfer2_edges_1:
        chamfer2.Add(CHAMFER2_SIZE, CHAMFER2_SIZE2, e.wrapped, chamfer2_side_1[0].wrapped)  # the first distance lies on this face
    for e in chamfer2_edges_2:
        chamfer2.Add(CHAMFER2_SIZE, CHAMFER2_SIZE2, e.wrapped, chamfer2_side_2[0].wrapped)  # the first distance lies on this face
    add(Compound.cast(chamfer2.Shape()), mode=Mode.REPLACE)

    # Chamfer3: one chamfer whose edges measure the first distance from different faces: ONE call of the kernel's chamfer builder (chamfer() names one face for all edges)
    chamfer3_edges_1 = [part.edges().sort_by_distance(p)[0] for p in [
        (-2.65, -10.75, -9.725),
    ]]
    chamfer3_side_1 = [part.faces().sort_by_distance(p)[0] for p in [
        (-2.65, -10.75, -6.605618417),
    ]]
    chamfer3_edges_2 = [part.edges().sort_by_distance(p)[0] for p in [
        (2.65, -10.75, -9.725),
    ]]
    chamfer3_side_2 = [part.faces().sort_by_distance(p)[0] for p in [
        (0, -10.75, -9.725),
    ]]
    chamfer3 = BRepFilletAPI_MakeChamfer(part.part.solid().wrapped)
    for e in chamfer3_edges_1:
        chamfer3.Add(CHAMFER3_SIZE, CHAMFER3_SIZE2, e.wrapped, chamfer3_side_1[0].wrapped)  # the first distance lies on this face
    for e in chamfer3_edges_2:
        chamfer3.Add(CHAMFER3_SIZE, CHAMFER3_SIZE2, e.wrapped, chamfer3_side_2[0].wrapped)  # the first distance lies on this face
    add(Compound.cast(chamfer3.Shape()), mode=Mode.REPLACE)

    # Fillet1
    fillet1_edges = [part.edges().sort_by_distance(p)[0] for p in [
        (0, 9.869618065, -4.013717919),
        (0, 8.955731032, -2.63302332),
    ]]
    fillet(fillet1_edges, radius=FILLET1_R)

    # Fillet2
    fillet2_edges = [part.edges().sort_by_distance(p)[0] for p in [
        (0, -11.25, 0.775),
        (0, -10.25, -0.225),
    ]]
    fillet(fillet2_edges, radius=FILLET2_R)

    # Fillet3
    fillet3_edges = [part.edges().sort_by_distance(p)[0] for p in [
        (-5.075, 2.45, -8.55),
        (-5.075, 7.675, -13.775),
        (-5.075, -7.75, 13.7),
        (-5.075, -2.525, 8.475),
        (5.075, -7.75, 13.7),
        (5.075, -2.525, 8.475),
        (5.075, 2.45, -8.55),
        (5.075, 7.675, -13.775),
    ]]
    fillet(fillet3_edges, radius=FILLET3_R)

    # Fillet4
    fillet4_edges = [part.edges().sort_by_distance(p)[0] for p in [
        (0, -7.95, -13.9),
        (0, 7.95, -13.9),
        (0, 7.95, 13.9),
        (0, -7.95, 13.9),
    ]]
    fillet(fillet4_edges, radius=FILLET4_R)


solid = part.part
